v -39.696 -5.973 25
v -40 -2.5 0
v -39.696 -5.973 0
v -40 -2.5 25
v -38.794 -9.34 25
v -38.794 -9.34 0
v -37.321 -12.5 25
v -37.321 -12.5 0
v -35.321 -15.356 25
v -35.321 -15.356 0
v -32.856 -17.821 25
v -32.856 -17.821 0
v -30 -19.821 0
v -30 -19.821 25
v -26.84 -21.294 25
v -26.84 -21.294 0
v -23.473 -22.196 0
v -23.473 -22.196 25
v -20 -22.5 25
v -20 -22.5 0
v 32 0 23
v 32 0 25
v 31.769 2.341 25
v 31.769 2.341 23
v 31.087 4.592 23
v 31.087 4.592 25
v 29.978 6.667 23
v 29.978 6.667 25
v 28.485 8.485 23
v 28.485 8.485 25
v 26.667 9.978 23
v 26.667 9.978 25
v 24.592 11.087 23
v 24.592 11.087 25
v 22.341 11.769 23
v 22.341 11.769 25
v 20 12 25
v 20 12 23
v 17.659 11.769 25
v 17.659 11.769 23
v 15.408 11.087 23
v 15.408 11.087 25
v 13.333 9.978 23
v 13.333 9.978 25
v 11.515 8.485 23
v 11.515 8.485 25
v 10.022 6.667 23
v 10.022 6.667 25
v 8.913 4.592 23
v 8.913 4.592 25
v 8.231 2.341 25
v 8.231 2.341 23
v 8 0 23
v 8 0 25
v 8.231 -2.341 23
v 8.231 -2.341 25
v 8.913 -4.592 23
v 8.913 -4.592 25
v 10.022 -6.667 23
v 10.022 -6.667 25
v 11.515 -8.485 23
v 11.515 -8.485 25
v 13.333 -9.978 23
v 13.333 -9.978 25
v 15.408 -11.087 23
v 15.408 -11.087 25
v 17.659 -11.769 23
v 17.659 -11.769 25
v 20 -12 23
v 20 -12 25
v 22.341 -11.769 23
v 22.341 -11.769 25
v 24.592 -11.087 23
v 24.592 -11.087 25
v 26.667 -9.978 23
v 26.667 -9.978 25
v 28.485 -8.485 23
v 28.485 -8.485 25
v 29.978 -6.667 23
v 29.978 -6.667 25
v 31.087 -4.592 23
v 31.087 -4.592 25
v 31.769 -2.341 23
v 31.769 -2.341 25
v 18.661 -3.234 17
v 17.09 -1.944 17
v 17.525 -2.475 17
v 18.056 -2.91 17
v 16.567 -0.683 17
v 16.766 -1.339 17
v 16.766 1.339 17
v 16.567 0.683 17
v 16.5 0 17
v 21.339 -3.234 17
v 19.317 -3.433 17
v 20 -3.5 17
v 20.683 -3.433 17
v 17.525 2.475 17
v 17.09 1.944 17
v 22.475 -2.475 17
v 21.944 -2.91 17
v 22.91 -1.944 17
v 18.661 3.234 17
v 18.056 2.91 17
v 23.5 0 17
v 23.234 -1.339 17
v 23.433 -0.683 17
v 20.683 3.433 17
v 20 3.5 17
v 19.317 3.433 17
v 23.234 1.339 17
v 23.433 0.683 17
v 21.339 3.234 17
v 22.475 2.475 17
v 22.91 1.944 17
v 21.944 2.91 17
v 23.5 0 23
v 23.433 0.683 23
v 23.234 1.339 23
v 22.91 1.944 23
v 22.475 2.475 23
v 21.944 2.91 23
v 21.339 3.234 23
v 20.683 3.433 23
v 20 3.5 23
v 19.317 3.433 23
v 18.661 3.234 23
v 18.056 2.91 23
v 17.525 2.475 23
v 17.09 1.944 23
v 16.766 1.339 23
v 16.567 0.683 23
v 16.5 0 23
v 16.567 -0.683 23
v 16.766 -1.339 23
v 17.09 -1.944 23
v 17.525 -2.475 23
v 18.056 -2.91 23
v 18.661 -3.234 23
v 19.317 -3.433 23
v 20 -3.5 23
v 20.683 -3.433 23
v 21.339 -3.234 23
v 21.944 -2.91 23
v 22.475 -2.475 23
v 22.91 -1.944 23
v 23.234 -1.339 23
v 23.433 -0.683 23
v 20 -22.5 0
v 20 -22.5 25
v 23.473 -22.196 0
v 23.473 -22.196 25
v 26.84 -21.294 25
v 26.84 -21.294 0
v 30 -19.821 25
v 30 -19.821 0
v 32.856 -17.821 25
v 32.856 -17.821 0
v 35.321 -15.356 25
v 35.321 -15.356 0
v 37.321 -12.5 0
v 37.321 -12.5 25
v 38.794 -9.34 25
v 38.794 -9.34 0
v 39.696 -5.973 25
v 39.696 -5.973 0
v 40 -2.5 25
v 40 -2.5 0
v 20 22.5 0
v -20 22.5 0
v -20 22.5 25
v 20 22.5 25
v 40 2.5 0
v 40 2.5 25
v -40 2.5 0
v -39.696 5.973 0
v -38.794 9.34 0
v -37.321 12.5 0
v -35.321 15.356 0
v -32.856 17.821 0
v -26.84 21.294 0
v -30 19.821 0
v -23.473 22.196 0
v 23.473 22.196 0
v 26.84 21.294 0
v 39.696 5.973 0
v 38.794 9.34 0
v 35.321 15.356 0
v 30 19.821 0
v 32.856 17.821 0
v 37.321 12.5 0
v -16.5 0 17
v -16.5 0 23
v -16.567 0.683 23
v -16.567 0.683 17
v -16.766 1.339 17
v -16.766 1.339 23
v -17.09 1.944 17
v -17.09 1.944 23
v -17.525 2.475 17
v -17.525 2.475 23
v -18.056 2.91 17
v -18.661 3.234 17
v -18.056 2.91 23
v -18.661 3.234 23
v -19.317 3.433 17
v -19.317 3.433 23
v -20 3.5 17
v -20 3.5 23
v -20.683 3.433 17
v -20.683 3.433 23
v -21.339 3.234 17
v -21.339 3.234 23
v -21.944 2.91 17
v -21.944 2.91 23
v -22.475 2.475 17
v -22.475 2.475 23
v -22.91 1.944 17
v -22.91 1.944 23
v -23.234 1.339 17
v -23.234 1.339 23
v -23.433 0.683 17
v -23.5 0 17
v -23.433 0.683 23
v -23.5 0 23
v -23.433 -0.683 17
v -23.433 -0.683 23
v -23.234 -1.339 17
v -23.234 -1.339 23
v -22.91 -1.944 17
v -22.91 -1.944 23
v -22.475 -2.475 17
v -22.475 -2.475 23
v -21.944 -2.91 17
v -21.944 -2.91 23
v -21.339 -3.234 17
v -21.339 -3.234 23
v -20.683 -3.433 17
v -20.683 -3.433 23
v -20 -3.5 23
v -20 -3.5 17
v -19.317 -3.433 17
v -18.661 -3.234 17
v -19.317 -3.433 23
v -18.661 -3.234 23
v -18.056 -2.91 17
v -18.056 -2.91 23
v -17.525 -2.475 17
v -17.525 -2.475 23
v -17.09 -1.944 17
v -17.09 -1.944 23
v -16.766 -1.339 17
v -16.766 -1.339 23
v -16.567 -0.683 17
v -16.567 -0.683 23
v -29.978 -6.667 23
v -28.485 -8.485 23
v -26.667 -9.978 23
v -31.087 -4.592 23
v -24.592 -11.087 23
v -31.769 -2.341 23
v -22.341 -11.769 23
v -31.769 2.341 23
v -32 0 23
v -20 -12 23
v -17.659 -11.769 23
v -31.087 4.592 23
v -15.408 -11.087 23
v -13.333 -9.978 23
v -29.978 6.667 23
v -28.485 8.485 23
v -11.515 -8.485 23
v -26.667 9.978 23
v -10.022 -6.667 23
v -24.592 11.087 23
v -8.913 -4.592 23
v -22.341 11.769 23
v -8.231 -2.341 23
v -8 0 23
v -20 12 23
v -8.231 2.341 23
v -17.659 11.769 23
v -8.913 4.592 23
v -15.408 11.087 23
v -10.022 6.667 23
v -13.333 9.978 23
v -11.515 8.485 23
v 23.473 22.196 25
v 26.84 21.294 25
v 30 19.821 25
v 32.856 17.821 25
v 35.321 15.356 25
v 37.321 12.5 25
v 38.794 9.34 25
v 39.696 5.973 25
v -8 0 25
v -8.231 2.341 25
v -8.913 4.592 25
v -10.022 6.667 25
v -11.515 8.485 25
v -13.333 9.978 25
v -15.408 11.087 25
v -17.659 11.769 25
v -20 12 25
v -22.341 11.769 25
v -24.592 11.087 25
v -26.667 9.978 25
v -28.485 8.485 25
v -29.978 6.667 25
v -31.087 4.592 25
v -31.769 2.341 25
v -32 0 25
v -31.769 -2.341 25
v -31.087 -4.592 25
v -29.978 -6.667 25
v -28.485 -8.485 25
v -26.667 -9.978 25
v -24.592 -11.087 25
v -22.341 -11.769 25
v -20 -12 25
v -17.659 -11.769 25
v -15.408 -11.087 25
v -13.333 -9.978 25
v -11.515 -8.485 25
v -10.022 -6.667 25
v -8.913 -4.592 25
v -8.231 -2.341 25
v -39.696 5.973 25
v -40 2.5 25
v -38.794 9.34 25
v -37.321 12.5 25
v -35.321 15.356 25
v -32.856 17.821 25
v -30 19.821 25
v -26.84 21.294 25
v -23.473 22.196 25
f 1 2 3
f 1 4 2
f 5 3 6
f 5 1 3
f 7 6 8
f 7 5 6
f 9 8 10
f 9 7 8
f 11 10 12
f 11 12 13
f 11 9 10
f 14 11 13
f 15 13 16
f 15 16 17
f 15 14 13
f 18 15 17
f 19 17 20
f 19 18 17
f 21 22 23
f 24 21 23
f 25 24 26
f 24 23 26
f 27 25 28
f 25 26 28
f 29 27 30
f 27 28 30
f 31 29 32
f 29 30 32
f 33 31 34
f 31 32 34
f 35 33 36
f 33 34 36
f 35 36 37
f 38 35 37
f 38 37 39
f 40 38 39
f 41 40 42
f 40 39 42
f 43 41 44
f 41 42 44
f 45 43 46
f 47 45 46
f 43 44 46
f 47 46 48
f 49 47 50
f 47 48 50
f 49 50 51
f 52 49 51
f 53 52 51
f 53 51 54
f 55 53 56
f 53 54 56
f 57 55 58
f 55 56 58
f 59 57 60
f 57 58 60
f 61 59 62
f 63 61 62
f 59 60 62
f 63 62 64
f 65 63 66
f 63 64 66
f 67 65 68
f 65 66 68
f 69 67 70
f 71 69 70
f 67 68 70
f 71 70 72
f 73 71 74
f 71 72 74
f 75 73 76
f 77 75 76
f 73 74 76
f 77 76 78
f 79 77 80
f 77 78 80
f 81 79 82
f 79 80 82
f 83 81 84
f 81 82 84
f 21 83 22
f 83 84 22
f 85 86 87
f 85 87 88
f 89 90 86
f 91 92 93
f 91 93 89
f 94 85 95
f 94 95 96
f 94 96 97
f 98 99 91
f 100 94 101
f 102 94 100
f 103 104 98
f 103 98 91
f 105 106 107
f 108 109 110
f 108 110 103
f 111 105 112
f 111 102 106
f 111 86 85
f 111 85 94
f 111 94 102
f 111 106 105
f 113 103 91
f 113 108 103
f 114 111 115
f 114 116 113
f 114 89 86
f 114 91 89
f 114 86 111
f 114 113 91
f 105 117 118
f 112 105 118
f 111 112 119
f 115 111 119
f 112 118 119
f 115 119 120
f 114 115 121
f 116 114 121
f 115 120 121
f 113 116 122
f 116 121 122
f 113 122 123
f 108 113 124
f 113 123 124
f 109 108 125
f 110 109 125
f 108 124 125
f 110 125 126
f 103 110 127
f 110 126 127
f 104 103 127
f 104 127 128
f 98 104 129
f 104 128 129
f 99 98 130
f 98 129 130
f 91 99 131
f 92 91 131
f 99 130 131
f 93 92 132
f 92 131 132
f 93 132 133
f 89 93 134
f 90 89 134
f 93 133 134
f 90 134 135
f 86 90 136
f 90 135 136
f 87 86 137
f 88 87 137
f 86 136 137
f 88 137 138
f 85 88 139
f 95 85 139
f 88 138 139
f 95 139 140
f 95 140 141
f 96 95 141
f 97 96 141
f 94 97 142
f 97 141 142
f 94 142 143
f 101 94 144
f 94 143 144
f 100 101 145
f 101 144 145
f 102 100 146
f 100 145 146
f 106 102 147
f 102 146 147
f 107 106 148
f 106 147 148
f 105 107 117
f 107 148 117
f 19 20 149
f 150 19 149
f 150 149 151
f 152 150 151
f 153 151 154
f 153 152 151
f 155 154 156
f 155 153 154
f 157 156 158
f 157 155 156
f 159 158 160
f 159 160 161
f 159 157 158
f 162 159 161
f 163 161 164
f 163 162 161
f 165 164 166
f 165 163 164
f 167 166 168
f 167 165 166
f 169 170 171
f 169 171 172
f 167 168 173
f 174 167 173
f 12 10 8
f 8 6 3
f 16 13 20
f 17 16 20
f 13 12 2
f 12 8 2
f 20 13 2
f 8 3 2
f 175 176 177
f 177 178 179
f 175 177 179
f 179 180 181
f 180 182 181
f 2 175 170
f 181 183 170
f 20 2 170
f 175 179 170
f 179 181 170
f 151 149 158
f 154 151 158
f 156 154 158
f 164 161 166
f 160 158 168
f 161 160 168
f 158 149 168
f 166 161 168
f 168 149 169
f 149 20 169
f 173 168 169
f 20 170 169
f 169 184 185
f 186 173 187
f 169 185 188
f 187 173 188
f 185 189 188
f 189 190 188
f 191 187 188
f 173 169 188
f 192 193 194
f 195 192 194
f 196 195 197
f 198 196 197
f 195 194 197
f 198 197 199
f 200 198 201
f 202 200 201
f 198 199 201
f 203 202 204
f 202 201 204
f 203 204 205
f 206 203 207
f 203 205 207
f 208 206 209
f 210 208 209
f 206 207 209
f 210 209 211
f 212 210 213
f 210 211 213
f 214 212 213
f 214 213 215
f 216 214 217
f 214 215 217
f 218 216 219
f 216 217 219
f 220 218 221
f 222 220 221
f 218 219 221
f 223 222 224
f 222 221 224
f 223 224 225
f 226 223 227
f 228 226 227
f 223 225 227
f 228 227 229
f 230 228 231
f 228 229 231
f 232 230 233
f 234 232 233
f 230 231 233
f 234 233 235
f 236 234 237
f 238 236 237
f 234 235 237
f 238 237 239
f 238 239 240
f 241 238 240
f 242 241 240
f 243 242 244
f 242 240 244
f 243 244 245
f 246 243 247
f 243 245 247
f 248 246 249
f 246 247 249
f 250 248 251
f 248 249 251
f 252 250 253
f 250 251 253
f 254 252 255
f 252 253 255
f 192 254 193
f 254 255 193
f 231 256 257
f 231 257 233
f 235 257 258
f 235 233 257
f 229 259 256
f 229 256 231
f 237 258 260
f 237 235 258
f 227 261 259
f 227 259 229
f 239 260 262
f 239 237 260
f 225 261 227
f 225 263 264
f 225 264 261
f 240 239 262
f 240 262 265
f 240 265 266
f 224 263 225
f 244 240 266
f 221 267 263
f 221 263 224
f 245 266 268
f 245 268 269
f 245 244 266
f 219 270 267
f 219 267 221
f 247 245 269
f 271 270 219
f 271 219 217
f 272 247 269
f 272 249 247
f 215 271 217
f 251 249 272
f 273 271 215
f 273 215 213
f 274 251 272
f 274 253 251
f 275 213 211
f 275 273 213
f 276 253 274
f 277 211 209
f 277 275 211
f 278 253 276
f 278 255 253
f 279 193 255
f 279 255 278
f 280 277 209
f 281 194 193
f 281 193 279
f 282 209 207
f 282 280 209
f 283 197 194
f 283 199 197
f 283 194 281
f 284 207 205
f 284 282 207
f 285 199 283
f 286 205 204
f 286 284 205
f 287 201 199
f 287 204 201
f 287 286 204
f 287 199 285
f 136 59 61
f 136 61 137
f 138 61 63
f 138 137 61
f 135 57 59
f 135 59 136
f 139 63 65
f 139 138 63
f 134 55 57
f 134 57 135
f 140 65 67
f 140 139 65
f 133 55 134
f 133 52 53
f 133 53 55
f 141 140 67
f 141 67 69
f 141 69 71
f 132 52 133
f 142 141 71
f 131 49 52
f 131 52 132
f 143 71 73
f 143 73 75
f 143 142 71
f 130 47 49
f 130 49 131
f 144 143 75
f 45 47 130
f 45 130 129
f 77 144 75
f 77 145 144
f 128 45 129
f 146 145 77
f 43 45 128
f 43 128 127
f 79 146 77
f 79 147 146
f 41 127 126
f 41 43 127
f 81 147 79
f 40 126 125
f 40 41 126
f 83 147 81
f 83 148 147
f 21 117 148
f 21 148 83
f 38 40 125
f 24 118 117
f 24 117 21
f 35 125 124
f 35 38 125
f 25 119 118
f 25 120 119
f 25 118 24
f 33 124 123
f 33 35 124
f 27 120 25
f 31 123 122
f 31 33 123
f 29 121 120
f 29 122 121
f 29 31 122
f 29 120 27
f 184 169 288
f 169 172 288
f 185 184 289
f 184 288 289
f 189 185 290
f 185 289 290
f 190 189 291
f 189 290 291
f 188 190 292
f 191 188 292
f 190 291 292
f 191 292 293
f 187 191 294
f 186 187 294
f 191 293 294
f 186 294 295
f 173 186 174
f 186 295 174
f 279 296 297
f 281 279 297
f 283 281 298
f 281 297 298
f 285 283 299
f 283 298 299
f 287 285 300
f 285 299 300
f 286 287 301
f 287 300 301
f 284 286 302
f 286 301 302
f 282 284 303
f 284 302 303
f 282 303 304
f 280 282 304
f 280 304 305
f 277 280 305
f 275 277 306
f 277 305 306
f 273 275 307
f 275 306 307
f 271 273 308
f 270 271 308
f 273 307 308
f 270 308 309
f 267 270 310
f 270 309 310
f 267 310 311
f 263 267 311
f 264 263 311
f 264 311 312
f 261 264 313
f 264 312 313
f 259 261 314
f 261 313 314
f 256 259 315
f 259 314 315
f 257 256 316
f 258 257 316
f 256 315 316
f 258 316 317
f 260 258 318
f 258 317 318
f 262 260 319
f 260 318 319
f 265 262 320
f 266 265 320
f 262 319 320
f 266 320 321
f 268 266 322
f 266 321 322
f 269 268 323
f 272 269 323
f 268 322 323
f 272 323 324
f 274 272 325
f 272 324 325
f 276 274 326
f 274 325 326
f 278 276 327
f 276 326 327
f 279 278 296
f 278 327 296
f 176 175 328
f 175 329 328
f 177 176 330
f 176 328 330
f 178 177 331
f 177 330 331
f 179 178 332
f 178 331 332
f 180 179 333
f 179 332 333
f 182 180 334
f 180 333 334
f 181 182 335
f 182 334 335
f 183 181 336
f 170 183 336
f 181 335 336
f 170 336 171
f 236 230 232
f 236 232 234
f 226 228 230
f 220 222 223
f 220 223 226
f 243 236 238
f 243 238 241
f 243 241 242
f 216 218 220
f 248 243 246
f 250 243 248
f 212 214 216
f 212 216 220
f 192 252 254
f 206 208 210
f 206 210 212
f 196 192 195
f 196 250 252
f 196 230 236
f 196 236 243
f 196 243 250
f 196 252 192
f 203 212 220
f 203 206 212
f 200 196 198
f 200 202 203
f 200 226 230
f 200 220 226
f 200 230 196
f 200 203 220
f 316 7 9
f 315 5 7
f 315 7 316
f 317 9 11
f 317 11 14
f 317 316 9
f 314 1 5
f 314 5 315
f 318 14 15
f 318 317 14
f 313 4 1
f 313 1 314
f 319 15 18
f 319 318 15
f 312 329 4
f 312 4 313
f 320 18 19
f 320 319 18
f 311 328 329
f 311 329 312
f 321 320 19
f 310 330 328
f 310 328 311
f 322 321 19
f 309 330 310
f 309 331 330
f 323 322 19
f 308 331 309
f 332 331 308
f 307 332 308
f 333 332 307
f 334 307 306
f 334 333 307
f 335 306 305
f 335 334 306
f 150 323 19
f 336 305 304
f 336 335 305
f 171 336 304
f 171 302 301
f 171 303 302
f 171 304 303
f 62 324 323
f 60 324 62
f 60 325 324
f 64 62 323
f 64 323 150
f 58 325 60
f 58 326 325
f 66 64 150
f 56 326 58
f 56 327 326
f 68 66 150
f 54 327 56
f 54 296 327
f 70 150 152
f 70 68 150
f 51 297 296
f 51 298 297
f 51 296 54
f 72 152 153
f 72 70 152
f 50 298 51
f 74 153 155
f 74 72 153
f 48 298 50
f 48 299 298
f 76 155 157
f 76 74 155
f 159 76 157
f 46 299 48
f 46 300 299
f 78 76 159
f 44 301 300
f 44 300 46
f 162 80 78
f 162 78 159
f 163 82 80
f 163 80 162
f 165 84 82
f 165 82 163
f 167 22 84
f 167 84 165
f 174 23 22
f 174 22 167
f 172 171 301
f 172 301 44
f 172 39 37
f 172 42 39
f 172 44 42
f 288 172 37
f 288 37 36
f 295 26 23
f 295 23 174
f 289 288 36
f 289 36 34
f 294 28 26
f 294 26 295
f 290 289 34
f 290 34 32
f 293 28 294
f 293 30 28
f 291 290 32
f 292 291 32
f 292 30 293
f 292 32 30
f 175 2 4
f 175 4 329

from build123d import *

# Parameters (mm, degrees)
F0_W     = 80
F0_H     = 45
F1_DEPTH = 25
F2_R     = 12
F3_DEPTH = 2
F4_R     = 3.5
F5_DEPTH = 6
F6_R     = 20


with BuildPart() as f1:
    # F0 (on Top) → F1 (new body)
    with BuildSketch(Plane.XY):
        Rectangle(F0_W, F0_H)
    extrude(amount=F1_DEPTH)

    # F2 (on face) → F3 (cut)
    with BuildSketch(Plane.XY.offset(25)):
        with Locations((-20, 0)):
            Circle(F2_R)
        with Locations((20, 0)):
            Circle(F2_R)
    extrude(amount=-F3_DEPTH, mode=Mode.SUBTRACT)

    # F4 (on face) → F5 (cut)
    with BuildSketch(Plane.XY.offset(23)):
        with Locations((-20, 0)):
            Circle(F4_R)
        with Locations((20, 0)):
            Circle(F4_R)
    extrude(amount=-F5_DEPTH, mode=Mode.SUBTRACT)

    # F6
    f6_edges = [f1.edges().sort_by_distance(p)[0] for p in [
        (-40, -22.5, 12.5),
        (-40, 22.5, 12.5),
        (40, -22.5, 12.5),
        (40, 22.5, 12.5),
    ]]
    fillet(f6_edges, radius=F6_R)


solid = f1.part
